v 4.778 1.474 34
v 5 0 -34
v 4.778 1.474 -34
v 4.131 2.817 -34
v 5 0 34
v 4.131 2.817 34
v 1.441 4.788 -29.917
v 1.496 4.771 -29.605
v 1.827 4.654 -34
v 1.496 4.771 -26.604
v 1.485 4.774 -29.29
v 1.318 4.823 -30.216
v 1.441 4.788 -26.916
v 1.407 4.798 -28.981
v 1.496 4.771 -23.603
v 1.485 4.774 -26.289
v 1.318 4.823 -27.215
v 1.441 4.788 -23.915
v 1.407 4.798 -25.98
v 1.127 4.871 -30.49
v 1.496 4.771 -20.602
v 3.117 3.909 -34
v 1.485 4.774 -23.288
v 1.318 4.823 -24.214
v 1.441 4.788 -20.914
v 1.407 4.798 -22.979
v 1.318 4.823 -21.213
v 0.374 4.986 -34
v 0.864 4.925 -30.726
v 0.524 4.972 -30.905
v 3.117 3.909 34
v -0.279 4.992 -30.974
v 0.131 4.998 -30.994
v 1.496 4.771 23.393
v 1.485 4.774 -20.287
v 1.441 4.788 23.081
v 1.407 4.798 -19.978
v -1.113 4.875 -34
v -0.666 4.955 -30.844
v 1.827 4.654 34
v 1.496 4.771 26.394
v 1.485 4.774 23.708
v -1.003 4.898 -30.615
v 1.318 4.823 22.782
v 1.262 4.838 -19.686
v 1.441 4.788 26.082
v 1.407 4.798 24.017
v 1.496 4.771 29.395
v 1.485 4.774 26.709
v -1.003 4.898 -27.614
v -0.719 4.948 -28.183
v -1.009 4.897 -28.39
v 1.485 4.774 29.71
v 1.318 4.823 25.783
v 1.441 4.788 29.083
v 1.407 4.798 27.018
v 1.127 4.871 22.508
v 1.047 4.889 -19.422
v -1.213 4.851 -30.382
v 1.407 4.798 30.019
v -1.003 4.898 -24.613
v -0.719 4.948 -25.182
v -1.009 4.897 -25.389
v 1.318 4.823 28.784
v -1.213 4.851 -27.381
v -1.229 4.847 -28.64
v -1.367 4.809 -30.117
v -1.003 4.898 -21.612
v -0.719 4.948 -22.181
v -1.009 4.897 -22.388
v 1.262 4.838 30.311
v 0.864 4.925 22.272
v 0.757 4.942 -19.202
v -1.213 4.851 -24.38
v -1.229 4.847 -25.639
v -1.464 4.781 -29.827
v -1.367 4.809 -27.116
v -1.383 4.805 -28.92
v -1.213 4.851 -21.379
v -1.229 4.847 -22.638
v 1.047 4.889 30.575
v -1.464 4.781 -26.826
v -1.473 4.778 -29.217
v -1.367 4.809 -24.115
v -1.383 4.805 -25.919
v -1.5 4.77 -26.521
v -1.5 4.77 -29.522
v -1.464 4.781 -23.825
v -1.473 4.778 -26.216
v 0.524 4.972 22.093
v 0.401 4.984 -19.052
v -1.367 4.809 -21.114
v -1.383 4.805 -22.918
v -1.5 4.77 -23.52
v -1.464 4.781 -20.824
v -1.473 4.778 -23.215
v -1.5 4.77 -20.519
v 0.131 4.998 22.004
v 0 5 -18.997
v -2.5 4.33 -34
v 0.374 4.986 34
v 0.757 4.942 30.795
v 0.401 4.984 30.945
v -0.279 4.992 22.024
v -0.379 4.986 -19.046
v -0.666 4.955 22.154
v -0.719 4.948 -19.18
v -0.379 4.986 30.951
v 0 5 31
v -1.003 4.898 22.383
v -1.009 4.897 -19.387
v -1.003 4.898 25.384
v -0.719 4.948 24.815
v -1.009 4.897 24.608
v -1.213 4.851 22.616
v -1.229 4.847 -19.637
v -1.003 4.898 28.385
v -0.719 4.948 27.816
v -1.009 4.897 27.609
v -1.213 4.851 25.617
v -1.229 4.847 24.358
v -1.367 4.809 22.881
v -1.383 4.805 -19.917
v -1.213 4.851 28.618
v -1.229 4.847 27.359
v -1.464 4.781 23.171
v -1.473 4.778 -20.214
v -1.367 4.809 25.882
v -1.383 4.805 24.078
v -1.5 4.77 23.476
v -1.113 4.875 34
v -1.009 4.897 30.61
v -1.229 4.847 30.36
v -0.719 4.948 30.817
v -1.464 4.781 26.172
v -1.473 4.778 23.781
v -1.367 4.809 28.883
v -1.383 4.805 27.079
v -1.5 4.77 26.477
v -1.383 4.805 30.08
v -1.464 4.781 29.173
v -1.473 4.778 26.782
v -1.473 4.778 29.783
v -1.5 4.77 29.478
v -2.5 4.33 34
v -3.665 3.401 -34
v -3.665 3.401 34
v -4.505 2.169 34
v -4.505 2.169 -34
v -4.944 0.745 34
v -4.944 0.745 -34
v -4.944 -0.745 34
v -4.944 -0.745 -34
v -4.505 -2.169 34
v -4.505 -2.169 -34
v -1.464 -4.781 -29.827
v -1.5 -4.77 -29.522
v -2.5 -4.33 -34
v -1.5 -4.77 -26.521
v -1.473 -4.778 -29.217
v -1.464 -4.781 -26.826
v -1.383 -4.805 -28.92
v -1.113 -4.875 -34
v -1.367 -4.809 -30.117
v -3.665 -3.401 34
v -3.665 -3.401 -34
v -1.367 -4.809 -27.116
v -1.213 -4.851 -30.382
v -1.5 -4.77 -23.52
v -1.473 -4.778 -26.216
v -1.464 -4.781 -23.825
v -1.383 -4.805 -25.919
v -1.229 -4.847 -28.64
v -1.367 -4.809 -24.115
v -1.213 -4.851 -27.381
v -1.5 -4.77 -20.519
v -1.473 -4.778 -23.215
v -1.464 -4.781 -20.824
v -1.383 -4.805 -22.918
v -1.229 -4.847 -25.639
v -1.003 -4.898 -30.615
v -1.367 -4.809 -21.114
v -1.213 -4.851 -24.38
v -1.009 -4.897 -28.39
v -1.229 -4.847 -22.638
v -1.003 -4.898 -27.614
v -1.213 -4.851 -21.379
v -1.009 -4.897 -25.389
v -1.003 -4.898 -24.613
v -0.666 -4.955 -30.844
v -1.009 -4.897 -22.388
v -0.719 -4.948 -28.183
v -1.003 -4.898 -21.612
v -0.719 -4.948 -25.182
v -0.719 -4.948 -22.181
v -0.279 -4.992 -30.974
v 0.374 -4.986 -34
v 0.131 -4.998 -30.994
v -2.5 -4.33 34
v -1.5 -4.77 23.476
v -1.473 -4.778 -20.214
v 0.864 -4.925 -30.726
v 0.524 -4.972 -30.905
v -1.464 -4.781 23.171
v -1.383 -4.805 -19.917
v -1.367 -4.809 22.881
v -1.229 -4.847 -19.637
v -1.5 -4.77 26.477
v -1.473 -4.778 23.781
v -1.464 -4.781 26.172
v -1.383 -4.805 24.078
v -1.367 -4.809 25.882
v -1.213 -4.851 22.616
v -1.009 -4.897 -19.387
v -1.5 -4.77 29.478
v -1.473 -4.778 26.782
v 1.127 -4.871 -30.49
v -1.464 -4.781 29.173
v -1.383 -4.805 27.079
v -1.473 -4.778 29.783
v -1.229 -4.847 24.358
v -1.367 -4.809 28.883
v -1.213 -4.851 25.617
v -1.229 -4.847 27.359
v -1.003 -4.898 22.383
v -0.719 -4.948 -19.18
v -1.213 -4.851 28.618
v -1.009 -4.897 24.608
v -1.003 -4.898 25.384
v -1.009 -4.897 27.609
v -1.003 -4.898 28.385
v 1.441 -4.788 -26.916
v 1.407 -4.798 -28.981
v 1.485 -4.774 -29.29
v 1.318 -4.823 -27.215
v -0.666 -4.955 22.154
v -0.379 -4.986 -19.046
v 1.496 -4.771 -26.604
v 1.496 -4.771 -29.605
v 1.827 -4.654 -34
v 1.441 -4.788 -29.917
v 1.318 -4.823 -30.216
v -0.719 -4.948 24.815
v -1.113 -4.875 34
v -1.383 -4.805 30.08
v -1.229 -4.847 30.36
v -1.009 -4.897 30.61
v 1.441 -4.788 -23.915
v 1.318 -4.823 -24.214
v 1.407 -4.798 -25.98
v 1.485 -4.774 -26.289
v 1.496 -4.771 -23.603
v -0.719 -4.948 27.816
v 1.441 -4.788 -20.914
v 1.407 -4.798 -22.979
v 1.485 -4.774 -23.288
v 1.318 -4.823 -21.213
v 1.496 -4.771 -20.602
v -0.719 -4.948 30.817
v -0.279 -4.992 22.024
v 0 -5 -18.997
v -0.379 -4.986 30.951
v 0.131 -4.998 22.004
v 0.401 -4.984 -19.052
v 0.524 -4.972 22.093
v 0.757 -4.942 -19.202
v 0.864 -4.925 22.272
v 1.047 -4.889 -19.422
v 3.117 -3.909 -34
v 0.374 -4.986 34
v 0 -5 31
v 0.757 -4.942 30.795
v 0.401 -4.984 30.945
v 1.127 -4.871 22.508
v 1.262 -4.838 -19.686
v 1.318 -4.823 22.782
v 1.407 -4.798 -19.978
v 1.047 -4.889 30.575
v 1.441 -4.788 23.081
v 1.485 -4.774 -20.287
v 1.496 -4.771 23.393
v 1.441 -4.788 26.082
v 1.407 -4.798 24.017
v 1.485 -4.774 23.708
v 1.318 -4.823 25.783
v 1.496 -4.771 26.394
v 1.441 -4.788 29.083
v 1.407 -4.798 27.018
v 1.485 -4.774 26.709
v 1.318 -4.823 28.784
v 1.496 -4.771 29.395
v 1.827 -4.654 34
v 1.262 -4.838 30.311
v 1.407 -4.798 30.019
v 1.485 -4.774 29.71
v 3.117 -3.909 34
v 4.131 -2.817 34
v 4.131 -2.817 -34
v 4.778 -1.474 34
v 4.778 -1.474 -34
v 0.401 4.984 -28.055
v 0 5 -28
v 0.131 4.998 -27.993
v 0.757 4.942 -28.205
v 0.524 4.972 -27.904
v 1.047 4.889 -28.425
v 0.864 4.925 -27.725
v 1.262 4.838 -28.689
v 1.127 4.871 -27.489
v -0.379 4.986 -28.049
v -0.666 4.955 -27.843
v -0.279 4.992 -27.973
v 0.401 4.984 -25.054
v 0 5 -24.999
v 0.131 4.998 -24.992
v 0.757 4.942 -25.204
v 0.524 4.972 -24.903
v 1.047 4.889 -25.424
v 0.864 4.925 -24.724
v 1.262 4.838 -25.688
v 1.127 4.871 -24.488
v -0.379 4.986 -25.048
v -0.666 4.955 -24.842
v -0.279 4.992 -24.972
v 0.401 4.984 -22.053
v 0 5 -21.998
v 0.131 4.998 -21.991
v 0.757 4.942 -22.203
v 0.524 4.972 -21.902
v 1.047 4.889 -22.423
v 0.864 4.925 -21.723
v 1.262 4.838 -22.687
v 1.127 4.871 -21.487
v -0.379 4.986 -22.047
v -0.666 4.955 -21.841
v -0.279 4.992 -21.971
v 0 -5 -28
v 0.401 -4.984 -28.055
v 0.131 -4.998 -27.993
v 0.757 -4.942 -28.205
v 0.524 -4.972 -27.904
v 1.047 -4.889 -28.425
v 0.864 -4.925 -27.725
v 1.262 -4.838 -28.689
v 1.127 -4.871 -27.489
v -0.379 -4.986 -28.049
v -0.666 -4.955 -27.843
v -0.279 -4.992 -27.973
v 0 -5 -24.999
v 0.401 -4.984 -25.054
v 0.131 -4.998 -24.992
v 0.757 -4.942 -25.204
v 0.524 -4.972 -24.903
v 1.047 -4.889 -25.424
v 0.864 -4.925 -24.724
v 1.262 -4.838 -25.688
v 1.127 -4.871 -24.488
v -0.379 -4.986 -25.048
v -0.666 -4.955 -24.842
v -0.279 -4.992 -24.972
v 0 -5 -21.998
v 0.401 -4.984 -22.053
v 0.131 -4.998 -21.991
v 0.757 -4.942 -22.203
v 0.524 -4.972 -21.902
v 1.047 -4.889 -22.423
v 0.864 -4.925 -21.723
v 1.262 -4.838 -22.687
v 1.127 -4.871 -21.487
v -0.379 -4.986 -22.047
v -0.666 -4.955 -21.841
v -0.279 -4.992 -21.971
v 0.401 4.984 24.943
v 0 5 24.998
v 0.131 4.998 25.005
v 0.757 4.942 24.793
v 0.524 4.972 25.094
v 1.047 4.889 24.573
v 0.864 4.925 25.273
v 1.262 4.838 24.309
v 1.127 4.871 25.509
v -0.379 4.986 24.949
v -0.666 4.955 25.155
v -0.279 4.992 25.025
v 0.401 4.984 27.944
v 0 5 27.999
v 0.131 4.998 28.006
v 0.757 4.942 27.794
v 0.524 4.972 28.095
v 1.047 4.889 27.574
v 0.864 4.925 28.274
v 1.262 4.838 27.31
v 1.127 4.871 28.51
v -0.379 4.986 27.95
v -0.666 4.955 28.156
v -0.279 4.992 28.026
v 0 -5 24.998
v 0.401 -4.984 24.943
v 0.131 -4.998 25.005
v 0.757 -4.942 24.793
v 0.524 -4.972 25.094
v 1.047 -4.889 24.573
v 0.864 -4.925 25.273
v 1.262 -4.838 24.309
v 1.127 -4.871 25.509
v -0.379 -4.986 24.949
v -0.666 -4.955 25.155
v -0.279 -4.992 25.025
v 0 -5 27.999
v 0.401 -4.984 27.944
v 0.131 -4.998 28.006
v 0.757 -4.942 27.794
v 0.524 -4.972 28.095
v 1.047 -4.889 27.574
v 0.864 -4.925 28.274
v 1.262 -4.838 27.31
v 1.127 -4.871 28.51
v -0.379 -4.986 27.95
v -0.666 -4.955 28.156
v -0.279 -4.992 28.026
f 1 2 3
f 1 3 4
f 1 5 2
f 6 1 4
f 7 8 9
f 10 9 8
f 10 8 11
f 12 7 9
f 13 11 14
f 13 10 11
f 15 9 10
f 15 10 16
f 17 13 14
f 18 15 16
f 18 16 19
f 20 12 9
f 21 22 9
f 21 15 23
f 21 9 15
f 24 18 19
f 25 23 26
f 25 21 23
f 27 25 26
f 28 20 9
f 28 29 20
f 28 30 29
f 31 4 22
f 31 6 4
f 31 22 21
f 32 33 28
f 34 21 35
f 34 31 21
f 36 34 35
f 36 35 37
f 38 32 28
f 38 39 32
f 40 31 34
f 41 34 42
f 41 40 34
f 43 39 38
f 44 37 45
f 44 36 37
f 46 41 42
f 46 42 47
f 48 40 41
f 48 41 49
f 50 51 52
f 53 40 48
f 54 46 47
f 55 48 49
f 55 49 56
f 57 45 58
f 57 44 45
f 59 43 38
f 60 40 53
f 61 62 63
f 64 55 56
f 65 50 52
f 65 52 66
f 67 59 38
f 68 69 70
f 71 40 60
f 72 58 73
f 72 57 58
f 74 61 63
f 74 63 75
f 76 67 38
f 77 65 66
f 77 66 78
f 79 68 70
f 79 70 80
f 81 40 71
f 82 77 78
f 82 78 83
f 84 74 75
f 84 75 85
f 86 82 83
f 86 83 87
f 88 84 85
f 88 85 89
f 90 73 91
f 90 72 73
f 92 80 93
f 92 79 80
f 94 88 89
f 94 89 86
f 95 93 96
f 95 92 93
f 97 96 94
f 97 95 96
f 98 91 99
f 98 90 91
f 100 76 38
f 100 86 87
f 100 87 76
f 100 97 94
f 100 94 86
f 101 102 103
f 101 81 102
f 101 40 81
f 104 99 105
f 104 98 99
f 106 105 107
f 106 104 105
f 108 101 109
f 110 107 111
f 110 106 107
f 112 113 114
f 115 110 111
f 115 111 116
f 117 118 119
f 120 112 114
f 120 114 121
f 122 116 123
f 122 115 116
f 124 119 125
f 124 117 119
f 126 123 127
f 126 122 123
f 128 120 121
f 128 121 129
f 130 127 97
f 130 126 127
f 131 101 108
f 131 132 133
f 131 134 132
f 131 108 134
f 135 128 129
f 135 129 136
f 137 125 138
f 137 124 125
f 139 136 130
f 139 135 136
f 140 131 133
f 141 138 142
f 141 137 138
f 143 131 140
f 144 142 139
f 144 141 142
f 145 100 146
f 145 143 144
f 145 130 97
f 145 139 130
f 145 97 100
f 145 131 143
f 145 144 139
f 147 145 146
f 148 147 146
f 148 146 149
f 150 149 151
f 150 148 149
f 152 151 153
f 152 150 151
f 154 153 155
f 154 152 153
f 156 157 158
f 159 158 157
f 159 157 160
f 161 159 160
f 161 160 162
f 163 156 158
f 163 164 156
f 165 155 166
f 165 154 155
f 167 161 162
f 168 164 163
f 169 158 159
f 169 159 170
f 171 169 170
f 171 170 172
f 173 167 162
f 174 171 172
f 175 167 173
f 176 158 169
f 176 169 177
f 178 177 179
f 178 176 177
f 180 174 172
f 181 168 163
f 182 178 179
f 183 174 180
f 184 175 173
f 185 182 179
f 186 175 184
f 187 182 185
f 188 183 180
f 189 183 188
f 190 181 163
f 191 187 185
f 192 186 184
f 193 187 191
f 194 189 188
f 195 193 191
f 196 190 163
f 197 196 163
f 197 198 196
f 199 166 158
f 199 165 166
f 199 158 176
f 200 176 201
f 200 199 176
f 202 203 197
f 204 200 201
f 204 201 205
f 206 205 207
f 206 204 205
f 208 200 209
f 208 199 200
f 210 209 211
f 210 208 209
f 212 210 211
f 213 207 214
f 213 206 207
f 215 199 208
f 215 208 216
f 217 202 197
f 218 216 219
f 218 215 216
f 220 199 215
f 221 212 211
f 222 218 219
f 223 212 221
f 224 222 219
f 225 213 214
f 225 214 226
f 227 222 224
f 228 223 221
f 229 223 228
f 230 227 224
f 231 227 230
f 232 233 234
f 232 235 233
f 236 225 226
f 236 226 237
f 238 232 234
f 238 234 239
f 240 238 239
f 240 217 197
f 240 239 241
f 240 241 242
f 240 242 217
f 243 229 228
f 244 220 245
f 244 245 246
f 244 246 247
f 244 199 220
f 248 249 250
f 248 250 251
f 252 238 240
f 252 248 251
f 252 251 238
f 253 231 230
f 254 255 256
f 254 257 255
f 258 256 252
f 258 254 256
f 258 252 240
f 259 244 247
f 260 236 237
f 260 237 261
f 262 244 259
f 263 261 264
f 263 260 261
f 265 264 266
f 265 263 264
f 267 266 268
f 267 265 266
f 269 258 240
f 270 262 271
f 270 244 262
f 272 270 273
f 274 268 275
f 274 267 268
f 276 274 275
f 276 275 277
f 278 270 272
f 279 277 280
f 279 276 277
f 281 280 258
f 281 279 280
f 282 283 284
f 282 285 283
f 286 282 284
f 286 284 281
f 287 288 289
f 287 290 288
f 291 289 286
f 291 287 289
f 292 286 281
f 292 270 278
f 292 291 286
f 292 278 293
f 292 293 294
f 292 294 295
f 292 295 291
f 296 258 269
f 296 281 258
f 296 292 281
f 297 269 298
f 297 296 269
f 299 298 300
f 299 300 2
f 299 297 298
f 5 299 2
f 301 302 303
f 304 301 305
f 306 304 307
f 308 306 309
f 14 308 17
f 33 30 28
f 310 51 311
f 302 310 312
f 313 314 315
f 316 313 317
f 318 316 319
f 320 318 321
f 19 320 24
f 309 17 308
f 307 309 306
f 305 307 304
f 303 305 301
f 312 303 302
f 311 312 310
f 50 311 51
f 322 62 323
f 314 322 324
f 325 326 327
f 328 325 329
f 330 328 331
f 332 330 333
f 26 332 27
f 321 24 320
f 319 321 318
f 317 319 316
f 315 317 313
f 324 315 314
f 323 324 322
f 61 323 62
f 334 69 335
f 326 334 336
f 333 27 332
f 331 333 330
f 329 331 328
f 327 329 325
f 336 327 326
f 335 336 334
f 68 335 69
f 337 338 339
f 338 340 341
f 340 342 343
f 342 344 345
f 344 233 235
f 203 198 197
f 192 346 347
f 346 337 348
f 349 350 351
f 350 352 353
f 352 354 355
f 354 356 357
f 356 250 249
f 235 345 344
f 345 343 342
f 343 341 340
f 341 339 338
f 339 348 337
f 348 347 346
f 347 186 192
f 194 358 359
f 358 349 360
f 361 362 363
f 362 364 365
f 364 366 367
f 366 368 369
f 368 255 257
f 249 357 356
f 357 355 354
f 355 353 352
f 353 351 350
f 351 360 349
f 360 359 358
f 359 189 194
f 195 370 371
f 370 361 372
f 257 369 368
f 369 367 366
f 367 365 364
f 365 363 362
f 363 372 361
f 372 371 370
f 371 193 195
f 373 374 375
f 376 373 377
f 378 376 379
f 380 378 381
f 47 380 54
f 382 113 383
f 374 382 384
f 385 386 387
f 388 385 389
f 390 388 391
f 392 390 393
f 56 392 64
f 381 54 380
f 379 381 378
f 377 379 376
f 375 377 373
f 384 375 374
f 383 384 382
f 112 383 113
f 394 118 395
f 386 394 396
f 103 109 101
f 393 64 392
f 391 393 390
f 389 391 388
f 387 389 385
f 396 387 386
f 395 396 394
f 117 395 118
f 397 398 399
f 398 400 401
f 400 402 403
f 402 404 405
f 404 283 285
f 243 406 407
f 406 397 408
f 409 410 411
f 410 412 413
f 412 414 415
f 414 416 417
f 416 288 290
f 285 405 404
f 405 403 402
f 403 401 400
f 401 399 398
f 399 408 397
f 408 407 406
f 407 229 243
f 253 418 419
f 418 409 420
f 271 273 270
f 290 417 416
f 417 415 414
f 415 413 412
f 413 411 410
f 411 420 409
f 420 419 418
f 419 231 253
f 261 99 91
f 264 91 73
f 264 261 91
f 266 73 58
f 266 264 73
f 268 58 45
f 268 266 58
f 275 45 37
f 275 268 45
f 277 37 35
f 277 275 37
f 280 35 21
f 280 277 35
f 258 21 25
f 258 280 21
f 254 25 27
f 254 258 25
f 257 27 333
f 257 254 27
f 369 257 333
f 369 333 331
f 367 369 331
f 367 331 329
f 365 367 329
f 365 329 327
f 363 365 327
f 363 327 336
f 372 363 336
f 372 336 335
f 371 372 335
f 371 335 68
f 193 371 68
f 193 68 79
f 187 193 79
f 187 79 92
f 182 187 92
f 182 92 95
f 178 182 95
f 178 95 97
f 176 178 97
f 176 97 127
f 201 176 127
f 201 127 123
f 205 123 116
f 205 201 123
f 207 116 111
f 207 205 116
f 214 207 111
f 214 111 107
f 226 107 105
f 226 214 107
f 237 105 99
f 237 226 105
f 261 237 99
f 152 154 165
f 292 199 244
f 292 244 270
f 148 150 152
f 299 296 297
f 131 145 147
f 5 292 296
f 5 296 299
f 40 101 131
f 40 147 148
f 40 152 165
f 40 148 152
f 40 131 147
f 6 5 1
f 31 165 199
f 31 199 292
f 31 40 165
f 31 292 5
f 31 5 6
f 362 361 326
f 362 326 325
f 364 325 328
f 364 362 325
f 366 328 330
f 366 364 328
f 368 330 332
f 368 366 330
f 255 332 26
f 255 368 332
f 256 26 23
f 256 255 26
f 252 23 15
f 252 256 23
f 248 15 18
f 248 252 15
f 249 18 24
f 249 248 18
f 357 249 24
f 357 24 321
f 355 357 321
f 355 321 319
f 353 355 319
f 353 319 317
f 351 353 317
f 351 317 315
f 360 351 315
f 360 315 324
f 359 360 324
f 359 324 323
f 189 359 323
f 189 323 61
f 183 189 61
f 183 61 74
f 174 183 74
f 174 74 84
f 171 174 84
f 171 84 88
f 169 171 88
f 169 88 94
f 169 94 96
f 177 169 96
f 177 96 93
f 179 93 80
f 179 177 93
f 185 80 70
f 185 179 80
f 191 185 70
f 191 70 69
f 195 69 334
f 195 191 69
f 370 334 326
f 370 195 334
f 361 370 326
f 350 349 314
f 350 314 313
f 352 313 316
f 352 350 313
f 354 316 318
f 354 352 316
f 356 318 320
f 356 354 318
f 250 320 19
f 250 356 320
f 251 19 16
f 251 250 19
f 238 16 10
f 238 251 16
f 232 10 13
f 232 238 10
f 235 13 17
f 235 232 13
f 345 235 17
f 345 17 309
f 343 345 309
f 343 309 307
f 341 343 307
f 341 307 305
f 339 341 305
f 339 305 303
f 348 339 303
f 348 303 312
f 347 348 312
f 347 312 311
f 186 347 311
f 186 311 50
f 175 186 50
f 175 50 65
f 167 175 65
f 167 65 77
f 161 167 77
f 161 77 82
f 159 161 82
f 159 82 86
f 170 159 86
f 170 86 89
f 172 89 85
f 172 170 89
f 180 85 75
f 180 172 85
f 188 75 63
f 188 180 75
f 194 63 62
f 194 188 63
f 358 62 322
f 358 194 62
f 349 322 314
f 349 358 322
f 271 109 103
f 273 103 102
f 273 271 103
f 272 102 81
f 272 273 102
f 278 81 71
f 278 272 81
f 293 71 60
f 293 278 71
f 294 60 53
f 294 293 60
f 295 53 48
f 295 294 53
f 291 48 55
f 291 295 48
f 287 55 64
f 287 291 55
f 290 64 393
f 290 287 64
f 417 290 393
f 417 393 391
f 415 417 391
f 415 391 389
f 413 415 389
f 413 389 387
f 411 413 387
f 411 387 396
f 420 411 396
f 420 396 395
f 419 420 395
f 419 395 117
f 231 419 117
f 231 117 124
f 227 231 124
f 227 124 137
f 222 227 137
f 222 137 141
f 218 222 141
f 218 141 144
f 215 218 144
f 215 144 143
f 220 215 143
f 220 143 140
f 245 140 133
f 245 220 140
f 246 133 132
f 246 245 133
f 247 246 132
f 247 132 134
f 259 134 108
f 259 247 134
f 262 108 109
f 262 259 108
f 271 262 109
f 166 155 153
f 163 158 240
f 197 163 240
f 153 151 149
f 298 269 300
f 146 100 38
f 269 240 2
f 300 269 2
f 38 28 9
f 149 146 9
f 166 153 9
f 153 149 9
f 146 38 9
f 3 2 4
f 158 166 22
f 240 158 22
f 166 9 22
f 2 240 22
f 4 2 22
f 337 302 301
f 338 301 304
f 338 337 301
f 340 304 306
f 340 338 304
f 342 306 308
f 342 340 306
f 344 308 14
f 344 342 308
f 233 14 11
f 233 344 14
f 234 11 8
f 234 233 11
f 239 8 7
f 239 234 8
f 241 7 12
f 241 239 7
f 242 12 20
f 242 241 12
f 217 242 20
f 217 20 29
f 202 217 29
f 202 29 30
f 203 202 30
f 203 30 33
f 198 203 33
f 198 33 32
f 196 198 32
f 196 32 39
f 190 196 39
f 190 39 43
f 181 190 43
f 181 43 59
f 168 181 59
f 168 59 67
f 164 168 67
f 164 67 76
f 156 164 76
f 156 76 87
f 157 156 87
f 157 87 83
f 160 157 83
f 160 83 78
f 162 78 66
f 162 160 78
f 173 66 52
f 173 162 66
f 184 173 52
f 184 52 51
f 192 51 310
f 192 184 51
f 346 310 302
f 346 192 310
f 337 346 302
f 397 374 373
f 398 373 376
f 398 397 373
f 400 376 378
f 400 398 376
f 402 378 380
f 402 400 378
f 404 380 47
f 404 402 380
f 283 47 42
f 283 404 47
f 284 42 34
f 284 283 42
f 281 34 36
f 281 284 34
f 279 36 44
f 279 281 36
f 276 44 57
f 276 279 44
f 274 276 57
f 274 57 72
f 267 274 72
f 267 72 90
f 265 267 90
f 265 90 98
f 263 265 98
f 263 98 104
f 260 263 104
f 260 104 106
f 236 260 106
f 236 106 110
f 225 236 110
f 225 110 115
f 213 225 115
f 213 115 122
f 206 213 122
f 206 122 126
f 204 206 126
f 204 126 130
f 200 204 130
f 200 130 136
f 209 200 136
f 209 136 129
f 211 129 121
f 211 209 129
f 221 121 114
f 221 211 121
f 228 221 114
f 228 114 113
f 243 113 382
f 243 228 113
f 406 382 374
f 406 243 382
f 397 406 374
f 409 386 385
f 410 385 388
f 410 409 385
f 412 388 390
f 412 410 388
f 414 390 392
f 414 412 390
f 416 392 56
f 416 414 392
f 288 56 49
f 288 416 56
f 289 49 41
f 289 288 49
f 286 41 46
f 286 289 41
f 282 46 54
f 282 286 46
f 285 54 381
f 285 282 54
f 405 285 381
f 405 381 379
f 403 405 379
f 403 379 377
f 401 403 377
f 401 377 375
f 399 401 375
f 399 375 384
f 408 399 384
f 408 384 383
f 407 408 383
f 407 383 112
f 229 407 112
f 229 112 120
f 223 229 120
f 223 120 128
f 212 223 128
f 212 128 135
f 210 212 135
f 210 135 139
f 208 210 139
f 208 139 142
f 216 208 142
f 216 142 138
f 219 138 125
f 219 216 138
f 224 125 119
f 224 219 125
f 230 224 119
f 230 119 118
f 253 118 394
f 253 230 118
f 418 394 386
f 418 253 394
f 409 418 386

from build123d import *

# Parameters (mm, degrees)
SKETCH1_R           = 5
BOSS_EXTRUDE1_DEPTH = 34
CUT_EXTRUDE1_START  = -35.727510708
SKETCH2_R           = 1.5
CUT_EXTRUDE1_DEPTH  = 66.455021417
LPATTERN3_COUNT     = 3
LPATTERN3_PITCH     = 3.001
CUT_EXTRUDE2_START  = -35.727510835
SKETCH3_R           = 1.5
CUT_EXTRUDE2_DEPTH  = 66.45502167
LPATTERN4_COUNT     = 4
LPATTERN4_PITCH     = 3.001


with BuildPart() as part:
    # Sketch1 → Boss-Extrude1 (new, symmetric)
    with BuildSketch(Plane.XY):
        Circle(SKETCH1_R)
    extrude(amount=BOSS_EXTRUDE1_DEPTH, both=True)

    # Sketch2 → Cut-Extrude1 (cut)
    with BuildSketch(Plane(origin=(0, 0, 0), x_dir=(1, 0, 0), z_dir=(0, 1, 0)).offset(CUT_EXTRUDE1_START)):
        with Locations(Location((0, -29.5, 0), (0, 0, 270))):
            Circle(SKETCH2_R)
    cut_extrude1 = extrude(amount=CUT_EXTRUDE1_DEPTH, mode=Mode.SUBTRACT)

    # LPattern3: Cut-Extrude1 ×3
    with Locations(*[(0, 0, -i * LPATTERN3_PITCH) for i in range(1, LPATTERN3_COUNT)]):
        add(cut_extrude1, mode=Mode.SUBTRACT)

    # Sketch3 → Cut-Extrude2 (cut)
    with BuildSketch(Plane(origin=(0, 0, 0), x_dir=(1, 0, 0), z_dir=(0, 1, 0)).offset(CUT_EXTRUDE2_START)):
        with Locations(Location((0, 29.5, 0), (0, 0, 270))):
            Circle(SKETCH3_R)
    cut_extrude2 = extrude(amount=CUT_EXTRUDE2_DEPTH, mode=Mode.SUBTRACT)

    # LPattern4: Cut-Extrude2 ×4
    with Locations(*[(0, 0, i * LPATTERN4_PITCH) for i in range(1, LPATTERN4_COUNT)]):
        add(cut_extrude2, mode=Mode.SUBTRACT)


solid = part.part
